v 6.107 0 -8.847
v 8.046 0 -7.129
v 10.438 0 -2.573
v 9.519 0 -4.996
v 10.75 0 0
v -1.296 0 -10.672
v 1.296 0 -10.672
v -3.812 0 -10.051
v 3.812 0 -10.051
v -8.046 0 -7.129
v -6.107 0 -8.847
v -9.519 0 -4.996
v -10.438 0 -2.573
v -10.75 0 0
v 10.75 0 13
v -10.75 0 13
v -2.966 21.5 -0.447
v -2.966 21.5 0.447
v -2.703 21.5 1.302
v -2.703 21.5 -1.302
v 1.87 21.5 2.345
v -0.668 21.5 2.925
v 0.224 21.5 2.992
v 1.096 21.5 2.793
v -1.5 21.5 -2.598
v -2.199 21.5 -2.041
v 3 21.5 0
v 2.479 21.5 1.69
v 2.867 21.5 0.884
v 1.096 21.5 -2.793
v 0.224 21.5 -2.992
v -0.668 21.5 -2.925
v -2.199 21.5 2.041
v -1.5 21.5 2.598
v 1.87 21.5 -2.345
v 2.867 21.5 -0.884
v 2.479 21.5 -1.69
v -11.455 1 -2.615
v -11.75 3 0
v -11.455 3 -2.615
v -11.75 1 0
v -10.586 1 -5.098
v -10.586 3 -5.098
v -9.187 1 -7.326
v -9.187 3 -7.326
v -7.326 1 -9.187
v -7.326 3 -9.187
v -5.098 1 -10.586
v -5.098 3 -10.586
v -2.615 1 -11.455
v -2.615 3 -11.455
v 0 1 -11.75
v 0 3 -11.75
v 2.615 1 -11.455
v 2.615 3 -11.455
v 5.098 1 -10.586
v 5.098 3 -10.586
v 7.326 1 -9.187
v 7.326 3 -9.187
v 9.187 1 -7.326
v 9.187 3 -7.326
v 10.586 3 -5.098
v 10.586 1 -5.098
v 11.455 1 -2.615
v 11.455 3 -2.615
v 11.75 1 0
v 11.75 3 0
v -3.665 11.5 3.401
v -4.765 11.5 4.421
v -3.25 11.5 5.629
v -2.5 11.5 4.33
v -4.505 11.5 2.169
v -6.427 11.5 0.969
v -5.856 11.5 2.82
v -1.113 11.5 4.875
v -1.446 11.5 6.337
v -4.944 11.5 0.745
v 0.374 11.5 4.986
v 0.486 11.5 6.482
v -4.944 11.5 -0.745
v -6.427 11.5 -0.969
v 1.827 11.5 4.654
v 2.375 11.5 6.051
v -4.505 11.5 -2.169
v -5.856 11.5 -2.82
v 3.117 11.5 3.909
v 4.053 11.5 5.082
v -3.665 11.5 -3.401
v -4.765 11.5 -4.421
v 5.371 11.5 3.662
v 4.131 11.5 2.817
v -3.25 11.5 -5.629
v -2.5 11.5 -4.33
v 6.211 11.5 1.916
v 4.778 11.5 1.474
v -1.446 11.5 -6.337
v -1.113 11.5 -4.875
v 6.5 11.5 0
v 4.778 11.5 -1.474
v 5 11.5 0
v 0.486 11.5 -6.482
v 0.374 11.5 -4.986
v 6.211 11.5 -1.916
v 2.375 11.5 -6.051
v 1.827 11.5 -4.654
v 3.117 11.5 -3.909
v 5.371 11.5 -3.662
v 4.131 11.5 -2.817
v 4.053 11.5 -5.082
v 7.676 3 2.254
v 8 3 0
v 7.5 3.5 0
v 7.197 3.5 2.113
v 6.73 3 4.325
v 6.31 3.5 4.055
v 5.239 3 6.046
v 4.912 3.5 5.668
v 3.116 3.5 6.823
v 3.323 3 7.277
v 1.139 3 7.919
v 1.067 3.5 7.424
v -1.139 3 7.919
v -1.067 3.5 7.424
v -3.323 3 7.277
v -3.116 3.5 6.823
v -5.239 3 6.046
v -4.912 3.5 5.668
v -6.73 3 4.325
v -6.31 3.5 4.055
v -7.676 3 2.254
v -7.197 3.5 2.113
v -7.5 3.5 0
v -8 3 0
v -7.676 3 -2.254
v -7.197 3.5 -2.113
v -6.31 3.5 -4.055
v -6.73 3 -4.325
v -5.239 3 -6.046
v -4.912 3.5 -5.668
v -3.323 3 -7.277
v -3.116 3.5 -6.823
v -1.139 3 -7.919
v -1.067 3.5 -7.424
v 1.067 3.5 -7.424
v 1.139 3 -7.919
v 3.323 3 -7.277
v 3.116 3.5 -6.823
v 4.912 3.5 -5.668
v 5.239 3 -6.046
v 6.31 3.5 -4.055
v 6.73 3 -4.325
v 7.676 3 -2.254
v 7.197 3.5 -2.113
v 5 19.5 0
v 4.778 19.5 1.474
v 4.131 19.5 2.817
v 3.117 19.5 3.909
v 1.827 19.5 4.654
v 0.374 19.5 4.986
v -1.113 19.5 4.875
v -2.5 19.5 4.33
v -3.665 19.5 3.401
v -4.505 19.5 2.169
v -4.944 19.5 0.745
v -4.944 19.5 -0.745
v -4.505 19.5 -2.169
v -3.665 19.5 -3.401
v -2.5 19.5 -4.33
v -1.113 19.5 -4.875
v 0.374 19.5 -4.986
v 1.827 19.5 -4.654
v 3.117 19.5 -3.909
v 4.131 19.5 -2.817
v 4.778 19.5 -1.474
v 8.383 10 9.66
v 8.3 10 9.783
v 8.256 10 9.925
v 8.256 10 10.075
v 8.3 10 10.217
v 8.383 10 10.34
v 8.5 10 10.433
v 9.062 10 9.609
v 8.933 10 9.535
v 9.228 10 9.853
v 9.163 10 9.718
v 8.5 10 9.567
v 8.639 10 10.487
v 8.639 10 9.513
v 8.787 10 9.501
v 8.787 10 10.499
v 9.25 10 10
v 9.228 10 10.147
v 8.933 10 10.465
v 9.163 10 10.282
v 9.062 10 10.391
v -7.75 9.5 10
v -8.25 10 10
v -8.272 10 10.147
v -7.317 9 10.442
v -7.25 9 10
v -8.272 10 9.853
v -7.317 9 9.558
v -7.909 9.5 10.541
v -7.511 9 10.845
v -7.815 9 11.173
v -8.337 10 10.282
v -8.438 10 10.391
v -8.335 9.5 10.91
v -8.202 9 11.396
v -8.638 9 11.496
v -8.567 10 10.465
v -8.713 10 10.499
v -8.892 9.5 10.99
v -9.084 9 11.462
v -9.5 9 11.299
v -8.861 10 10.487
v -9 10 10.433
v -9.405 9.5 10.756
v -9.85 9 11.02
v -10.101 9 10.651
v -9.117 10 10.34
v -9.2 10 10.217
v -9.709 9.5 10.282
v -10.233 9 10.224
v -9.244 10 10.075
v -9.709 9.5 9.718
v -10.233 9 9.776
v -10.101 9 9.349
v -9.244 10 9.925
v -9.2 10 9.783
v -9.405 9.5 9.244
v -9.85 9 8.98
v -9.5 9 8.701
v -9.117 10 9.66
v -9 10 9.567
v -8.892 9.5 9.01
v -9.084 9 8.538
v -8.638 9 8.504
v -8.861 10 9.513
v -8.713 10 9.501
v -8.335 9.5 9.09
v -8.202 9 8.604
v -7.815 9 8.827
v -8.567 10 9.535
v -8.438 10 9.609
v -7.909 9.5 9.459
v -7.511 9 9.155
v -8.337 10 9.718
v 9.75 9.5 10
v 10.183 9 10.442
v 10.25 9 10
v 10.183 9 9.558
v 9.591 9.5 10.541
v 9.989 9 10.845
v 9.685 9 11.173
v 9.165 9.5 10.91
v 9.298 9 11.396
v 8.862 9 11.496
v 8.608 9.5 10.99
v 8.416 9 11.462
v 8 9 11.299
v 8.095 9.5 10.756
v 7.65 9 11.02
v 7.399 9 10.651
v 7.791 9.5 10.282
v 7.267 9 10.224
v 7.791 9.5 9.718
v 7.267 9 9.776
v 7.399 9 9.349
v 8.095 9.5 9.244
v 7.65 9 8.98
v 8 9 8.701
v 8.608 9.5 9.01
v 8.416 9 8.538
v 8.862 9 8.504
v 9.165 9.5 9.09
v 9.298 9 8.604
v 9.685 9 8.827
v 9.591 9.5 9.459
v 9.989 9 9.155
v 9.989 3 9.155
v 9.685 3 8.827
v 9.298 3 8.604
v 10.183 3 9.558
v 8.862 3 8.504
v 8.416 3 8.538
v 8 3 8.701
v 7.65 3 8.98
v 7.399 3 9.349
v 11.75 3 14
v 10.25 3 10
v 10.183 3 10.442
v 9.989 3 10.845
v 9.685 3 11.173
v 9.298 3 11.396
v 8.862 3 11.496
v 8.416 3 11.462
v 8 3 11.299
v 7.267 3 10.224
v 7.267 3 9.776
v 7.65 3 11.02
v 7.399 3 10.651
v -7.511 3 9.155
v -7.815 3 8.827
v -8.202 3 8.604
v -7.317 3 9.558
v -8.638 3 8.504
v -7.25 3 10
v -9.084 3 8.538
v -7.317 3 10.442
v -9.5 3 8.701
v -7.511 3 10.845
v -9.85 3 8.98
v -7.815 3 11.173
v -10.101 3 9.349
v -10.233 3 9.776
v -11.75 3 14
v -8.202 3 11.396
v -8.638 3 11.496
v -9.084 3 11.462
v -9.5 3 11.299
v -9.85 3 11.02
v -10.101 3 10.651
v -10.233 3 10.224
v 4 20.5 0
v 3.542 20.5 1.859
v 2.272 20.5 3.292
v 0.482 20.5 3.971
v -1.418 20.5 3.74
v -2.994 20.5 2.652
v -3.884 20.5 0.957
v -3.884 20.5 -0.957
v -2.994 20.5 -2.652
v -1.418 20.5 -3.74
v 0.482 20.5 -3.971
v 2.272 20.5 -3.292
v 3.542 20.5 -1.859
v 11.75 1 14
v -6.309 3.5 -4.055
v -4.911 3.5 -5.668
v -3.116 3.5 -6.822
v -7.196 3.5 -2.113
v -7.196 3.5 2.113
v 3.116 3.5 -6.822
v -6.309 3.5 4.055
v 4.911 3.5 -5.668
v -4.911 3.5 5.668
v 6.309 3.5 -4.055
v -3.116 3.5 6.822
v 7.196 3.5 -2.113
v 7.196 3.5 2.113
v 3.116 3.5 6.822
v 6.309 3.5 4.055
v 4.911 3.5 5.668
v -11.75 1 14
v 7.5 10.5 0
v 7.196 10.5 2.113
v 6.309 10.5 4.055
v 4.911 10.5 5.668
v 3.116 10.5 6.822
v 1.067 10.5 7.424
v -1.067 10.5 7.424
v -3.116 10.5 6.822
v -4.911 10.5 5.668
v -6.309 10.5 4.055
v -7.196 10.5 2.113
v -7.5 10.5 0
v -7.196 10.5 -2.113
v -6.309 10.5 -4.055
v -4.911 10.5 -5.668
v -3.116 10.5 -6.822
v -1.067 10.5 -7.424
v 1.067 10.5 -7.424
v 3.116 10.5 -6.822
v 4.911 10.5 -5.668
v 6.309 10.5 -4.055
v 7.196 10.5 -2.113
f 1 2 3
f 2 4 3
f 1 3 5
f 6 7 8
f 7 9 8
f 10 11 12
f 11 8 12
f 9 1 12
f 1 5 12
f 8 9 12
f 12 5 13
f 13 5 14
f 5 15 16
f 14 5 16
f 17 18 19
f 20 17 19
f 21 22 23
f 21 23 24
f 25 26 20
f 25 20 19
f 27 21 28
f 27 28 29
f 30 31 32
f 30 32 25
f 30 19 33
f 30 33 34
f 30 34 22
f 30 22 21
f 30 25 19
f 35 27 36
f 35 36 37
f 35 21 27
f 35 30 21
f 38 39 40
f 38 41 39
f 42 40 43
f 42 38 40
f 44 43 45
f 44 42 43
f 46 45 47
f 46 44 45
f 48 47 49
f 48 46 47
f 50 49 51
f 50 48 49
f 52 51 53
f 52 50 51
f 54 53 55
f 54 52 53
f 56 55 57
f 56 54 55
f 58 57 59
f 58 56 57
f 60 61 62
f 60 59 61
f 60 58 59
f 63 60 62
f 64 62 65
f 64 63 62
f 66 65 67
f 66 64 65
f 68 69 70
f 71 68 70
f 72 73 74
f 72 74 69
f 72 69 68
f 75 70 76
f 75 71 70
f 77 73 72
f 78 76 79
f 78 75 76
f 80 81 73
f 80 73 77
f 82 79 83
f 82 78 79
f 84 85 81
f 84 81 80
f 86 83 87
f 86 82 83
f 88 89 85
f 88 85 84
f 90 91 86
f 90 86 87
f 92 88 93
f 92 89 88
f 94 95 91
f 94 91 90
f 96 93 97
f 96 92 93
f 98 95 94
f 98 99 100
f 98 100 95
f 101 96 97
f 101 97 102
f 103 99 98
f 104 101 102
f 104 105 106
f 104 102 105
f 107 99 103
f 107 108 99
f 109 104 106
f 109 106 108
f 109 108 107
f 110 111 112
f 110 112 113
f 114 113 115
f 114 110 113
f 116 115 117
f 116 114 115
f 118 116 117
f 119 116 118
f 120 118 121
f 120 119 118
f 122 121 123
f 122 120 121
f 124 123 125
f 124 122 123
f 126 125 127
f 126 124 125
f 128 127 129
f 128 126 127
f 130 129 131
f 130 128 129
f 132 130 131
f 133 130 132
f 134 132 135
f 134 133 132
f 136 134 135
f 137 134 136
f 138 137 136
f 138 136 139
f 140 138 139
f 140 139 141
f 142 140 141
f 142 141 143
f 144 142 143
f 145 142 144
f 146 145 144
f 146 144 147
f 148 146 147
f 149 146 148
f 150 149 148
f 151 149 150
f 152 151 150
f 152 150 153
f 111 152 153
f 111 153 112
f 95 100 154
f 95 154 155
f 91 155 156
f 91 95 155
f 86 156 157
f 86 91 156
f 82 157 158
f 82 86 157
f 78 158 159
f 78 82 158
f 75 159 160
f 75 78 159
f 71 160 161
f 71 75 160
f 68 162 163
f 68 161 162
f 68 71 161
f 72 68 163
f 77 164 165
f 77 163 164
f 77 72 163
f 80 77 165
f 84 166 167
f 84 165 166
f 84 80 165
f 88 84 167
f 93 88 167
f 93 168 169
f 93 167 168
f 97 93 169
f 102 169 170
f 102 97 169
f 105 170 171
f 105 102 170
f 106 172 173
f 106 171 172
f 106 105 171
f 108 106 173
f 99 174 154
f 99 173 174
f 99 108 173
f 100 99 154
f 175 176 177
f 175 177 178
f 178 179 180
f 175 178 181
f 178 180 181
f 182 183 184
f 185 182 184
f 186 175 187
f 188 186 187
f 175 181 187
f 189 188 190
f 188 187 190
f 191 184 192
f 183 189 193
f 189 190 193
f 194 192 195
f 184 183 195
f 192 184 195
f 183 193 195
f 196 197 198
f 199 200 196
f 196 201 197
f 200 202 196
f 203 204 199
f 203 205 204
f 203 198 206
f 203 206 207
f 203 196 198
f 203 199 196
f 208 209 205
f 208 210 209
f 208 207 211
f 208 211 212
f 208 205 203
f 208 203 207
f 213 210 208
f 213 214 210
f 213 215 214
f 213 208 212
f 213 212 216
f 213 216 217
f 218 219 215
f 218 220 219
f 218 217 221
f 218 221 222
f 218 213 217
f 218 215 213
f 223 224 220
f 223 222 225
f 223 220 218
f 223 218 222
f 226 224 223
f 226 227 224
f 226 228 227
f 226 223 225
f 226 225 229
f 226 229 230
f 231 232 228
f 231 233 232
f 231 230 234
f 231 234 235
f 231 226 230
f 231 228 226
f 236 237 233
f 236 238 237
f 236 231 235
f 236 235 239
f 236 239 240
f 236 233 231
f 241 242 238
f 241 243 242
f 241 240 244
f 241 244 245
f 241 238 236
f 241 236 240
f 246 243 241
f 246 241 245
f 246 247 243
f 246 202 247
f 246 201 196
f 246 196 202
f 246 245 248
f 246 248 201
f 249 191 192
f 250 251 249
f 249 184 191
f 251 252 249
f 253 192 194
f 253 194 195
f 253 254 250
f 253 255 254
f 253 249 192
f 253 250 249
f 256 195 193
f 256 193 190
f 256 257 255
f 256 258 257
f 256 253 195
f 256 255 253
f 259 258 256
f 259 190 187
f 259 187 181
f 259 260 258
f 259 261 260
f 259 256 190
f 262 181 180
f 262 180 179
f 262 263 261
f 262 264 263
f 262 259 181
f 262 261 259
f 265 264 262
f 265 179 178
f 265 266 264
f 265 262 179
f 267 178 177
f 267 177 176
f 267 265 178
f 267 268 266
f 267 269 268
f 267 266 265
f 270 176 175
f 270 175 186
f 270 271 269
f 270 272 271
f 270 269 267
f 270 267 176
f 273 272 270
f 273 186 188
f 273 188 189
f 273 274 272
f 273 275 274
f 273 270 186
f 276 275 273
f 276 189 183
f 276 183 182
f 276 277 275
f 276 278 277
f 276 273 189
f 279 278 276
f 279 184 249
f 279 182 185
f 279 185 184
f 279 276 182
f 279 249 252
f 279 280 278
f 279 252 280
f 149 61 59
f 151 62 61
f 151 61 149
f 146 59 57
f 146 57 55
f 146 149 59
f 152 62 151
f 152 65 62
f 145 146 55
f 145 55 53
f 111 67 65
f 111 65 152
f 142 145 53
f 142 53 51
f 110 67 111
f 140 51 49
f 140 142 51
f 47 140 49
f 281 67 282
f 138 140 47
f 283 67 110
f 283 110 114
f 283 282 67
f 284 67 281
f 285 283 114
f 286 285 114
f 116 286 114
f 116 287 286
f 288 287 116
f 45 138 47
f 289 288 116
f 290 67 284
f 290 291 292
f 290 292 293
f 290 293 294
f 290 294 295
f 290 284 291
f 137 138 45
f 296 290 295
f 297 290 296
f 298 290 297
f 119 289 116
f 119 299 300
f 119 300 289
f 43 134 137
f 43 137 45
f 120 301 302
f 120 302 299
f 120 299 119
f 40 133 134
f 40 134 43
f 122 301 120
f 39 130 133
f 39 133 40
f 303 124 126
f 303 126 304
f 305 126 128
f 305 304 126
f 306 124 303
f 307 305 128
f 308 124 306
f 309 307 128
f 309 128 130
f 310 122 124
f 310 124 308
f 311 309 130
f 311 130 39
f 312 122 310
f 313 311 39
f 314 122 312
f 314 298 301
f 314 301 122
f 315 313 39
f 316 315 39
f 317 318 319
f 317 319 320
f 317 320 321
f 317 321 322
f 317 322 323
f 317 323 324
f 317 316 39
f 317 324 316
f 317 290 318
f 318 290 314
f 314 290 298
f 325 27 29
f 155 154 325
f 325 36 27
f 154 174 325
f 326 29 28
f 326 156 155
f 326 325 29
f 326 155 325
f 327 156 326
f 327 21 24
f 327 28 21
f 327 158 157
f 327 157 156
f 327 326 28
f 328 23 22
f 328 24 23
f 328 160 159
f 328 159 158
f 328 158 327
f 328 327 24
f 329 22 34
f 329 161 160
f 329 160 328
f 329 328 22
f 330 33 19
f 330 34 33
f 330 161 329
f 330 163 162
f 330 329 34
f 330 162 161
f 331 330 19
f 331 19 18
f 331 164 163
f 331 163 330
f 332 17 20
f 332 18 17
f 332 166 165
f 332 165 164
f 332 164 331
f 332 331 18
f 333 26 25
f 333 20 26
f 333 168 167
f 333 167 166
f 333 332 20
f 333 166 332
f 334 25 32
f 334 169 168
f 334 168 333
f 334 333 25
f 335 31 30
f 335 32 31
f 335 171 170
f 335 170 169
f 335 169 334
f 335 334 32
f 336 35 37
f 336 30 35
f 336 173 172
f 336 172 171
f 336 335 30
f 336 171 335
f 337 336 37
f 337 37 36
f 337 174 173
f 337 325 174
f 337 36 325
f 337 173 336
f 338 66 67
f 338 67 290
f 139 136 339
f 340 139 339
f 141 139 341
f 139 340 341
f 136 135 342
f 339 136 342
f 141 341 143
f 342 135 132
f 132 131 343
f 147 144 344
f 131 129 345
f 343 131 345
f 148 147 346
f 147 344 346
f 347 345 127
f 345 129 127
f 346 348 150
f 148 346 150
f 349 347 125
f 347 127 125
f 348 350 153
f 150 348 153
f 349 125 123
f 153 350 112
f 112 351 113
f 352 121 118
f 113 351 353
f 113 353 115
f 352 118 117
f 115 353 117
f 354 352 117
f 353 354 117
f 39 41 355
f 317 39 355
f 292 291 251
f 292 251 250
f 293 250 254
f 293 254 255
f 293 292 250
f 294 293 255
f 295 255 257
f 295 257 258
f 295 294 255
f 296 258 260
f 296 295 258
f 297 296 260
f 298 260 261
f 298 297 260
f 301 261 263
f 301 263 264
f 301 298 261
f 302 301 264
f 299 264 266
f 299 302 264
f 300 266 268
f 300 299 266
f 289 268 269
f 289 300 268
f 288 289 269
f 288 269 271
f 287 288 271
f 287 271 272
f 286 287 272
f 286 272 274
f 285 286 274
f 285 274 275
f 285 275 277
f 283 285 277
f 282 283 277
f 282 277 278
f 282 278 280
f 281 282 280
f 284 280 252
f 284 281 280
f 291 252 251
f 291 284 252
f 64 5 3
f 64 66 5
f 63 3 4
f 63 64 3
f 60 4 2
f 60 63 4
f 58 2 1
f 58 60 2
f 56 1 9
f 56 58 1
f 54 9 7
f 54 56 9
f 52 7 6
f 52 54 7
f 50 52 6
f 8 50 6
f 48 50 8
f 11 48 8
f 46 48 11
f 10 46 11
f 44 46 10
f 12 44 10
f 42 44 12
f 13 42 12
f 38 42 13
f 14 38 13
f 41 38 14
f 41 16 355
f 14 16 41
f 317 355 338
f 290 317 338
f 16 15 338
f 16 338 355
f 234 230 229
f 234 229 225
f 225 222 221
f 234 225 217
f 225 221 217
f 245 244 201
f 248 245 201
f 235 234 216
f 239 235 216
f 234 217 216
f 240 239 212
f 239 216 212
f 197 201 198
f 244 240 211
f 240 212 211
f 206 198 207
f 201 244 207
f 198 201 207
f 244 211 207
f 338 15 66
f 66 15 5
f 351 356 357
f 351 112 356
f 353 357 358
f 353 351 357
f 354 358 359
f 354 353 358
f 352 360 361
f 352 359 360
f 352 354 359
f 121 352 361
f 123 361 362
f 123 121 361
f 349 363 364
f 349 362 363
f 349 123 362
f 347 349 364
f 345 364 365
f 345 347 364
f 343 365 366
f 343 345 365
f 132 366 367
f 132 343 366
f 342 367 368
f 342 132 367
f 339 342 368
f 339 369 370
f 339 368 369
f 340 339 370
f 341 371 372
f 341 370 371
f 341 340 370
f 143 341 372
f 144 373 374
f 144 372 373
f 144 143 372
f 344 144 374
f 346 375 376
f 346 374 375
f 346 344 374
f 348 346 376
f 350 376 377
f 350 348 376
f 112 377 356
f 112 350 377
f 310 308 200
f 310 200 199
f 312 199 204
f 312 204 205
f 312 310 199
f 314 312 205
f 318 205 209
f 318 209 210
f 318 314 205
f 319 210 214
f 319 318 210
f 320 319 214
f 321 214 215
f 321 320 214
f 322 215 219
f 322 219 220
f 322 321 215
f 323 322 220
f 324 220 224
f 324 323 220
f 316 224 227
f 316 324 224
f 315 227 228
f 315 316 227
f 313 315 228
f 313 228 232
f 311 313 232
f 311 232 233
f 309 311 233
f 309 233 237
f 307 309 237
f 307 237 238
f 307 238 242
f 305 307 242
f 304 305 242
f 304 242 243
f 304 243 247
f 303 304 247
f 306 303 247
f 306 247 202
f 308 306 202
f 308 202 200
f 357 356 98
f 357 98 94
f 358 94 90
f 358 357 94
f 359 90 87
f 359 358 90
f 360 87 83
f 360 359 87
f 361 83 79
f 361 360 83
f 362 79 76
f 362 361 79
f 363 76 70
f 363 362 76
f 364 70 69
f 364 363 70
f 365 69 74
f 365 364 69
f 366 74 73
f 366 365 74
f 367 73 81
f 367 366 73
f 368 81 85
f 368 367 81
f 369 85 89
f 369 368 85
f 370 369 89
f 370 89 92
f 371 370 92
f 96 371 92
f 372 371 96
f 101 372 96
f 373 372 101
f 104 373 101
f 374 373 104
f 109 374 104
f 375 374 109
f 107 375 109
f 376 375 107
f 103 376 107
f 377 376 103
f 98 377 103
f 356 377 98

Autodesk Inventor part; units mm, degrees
ref_plane "YZ Plane" through (0, 0, 0) normal (1, 0, 0) x (0, 1, 0)
ref_plane "XZ Plane" through (0, 0, 0) normal (0, 1, 0) x (-1, 0, 0)
ref_plane "XY Plane" through (0, 0, 0) normal (0, 0, 1) x (1, 0, 0)
sketch "Boceto1" plane through (0, 0, 0) normal (0, 1, 0) x (-1, 0, 0)
  circle A0 centre (0, 0) radius 8
  circle A1 centre (8.75, 10) radius 1.5
  circle A2 centre (-8.75, 10) radius 1.5
  circle A3 centre (-8.75, 10) radius 1.5
  circle A4 centre (8.75, 10) radius 1.5
  line L0 (11.75, 10) -> (11.75, 14)
  line L1 (11.75, 14) -> (-8.75, 14)
  line L2 (-11.75, 10) -> (-11.75, 14)
  line L3 (-11.75, 14) -> (-8.75, 14)
  arc A5 (-11.75, 0) -> (11.75, 0) centre (0, 0) ccw
  line L4 (11.75, 0) -> (11.75, 10)
  line L5 (-11.75, 0) -> (-11.75, 10.3265)
extrude "Extrusión1" add sketch "Boceto1" along normal blind 3
sketch "Boceto2" plane through (0, 0, 0) normal (0, -1, 0) x (1, 0, 0)
  circle A0 centre (8.75, 10) radius 1.5 projected
  circle A1 centre (8.75, 10) radius 1.5
  circle A2 centre (-8.75, 10) radius 1.5 projected
  circle A3 centre (-8.75, 10) radius 1.5
  point P0 (0, 0)
extrude "Extrusión2" add sketch "Boceto2" against normal blind 10
sketch "Boceto3" plane through (0, 0, 0) normal (0, -1, 0) x (1, 0, 0)
  circle A0 centre (0, 0) radius 8
extrude "Extrusión3" add sketch "Boceto3" against normal blind 3.5
sketch "Boceto4" plane through (0, 3.5, 0) normal (0, 1, 0) x (1, 0, 0)
  circle A0 centre (0, 0) radius 7.5
  dimension "d16" = 15
extrude "Extrusión4" add sketch "Boceto4" along normal blind 8
sketch "Boceto5" plane through (0, 11.5, 0) normal (0, 1, 0) x (1, 0, 0)
  circle A0 centre (0, 0) radius 5
  dimension "d19" = 10
extrude "Extrusión5" add sketch "Boceto5" along normal blind 10
chamfer "Chaflán1" distance 0.5 angle 45 1 edges at (-8, 3.5, 0)
chamfer "Chaflán2" distance 1 angle 45 1 edges at (-7.5, 11.5, 0)
chamfer "Chaflán3" distance 2 angle 45 1 edges at (-5, 21.5, 0)
chamfer "Chaflán4" distance 1 angle 45 2 edges at (-10.25, 10, 10) (7.25, 10, 10)
chamfer "Chaflán5" distance 1 angle 45 4 edges at (0, 0, 14) (11.75, 0, 7) (0, 0, -11.75) (-11.75, 0, 7)
properties part number "soporte_brazo_art"
